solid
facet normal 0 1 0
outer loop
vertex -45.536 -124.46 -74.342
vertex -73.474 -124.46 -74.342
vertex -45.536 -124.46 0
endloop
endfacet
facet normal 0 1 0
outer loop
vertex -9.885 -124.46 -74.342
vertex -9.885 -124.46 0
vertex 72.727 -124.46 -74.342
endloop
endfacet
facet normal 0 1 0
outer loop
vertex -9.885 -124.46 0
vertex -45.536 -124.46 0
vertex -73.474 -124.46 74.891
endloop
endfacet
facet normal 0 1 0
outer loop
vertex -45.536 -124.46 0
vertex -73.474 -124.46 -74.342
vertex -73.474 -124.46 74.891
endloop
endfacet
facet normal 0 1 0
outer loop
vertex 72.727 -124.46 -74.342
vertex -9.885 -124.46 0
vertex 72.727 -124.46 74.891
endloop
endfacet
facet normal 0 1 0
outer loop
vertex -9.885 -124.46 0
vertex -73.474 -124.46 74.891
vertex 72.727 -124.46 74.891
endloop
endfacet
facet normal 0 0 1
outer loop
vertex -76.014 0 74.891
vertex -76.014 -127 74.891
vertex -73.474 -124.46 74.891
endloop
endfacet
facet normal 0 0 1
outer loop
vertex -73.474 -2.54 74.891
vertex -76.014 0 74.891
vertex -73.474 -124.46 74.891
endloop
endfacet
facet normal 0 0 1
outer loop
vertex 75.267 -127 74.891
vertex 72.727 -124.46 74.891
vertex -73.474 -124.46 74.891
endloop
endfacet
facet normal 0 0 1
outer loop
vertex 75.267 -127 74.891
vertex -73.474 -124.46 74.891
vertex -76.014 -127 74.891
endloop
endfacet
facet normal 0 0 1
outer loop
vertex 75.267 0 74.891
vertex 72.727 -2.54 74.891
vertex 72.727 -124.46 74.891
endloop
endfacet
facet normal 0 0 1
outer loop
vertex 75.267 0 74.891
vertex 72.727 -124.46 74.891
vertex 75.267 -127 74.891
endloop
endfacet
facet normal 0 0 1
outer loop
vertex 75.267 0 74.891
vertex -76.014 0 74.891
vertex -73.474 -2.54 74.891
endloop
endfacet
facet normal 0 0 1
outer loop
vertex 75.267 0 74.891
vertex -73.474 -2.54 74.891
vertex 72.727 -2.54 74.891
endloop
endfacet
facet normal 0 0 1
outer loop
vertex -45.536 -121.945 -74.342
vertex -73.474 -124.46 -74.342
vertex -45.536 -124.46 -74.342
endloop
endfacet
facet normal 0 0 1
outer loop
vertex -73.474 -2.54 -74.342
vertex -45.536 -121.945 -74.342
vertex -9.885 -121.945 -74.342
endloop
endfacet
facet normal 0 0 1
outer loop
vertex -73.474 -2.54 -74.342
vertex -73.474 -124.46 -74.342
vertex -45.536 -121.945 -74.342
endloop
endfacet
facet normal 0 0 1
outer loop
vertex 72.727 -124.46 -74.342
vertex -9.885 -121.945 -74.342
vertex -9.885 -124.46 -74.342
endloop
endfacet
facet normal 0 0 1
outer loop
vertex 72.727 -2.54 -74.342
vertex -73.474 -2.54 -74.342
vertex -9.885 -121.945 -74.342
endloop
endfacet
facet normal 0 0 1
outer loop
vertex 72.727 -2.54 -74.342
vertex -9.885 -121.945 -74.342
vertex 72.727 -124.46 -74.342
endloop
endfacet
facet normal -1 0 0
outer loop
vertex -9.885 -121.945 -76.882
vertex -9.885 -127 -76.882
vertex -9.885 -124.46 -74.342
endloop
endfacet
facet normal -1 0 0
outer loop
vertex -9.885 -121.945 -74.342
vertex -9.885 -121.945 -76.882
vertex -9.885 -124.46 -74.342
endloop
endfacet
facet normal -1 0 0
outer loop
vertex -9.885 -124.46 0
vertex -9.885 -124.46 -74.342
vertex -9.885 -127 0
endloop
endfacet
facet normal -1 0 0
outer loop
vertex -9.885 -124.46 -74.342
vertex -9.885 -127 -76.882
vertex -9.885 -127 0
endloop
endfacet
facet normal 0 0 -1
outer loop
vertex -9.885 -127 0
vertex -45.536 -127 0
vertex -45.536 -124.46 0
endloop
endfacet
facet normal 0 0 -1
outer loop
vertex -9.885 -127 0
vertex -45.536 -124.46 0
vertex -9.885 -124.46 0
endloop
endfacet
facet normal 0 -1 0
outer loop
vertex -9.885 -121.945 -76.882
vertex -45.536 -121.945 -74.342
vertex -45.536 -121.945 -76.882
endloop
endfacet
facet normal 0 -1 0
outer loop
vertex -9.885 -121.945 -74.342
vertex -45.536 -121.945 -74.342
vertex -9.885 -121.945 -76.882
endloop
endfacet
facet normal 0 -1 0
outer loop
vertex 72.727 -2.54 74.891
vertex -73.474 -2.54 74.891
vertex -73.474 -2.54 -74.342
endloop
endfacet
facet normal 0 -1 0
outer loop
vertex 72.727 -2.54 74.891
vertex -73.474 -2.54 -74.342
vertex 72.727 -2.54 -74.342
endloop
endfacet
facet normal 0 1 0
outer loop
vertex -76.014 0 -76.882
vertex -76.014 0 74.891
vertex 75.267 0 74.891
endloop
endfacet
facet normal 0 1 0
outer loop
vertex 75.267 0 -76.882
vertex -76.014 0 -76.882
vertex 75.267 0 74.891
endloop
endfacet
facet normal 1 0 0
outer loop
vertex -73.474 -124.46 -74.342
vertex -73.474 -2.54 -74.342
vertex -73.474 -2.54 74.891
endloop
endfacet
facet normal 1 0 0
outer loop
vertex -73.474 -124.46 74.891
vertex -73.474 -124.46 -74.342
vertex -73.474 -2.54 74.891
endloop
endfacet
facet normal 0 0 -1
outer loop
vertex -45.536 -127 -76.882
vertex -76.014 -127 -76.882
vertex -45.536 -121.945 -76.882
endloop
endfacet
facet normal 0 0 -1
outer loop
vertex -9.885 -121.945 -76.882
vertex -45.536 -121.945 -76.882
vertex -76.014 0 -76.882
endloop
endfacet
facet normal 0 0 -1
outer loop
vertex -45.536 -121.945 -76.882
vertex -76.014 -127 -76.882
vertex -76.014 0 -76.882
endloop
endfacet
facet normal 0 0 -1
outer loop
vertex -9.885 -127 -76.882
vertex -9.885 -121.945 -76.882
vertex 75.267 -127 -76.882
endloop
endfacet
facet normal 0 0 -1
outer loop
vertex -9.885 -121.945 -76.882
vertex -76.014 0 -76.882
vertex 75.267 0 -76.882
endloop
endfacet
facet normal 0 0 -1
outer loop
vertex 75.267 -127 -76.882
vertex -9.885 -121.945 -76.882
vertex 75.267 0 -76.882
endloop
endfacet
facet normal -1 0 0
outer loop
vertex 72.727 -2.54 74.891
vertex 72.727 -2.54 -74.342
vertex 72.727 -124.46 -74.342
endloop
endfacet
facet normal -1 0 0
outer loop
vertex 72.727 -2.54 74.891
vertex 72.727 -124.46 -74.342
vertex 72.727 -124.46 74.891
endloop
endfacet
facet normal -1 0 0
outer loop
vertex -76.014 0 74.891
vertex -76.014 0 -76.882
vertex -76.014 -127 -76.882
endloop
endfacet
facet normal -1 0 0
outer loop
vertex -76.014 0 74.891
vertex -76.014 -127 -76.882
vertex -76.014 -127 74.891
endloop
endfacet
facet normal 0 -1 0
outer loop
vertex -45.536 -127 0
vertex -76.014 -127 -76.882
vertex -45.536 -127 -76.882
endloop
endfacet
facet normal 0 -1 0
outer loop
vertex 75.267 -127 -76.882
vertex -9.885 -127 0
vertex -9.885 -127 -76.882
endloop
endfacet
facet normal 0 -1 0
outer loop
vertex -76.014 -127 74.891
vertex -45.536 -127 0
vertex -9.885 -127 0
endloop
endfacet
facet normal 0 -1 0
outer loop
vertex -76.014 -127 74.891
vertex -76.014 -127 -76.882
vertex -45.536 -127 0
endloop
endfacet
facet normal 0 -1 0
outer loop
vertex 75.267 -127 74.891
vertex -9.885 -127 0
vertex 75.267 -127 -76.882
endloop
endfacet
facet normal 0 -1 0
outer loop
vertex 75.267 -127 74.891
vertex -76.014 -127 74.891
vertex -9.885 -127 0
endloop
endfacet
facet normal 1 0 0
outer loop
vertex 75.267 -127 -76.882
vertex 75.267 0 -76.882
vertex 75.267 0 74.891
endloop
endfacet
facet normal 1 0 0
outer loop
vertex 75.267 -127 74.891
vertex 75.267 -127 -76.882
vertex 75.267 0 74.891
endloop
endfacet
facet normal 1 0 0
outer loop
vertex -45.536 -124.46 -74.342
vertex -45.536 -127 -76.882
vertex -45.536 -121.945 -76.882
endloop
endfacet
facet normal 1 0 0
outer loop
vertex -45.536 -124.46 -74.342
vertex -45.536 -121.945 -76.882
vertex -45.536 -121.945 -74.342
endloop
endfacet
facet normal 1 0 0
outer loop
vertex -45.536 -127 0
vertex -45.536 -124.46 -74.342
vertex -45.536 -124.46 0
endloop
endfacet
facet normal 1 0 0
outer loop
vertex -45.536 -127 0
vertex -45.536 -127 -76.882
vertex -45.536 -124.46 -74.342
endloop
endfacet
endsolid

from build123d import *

# Parameters (mm, degrees)
F0_W      = 152.267947793
F0_H      = 151.1743441224
F1_DEPTH  = 101.6
F2_SIZE   = 50.8
F3_SIZE   = 50.79999
F4_SIZE   = 50.8
F5_T      = -2.54
F7_W      = 151.2815654278
F7_H      = 151.7730951309
F8_DEPTH  = 127
F9_T      = -2.54
F10_W     = 35.6509871781
F10_H     = 76.8820419908
F11_DEPTH = 0.0254
F12_DEPTH = 2.54
F13_DEPTH = 2.54


# Not quite as in the source:
# - a fillet or chamfer is up to 0.001 mm smaller than in the source, because OpenCascade refuses the exact size


with BuildPart() as f1:
    # F0 (on Top) → F1 (new body)
    with BuildSketch(Plane.XY):
        with Locations((-0.6233751774, 0.4115886986)):
            Rectangle(F0_W, F0_H)
    extrude(amount=F1_DEPTH)

    # F2
    f2_edges = [f1.edges().sort_by_distance(p)[0] for p in [
        (-76.757349, 0.411589, 101.6),
        (-0.623375, -75.175583, 101.6),
        (75.510599, 0.411589, 101.6),
        (-0.623375, 75.998761, 101.6),
    ]]
    chamfer(f2_edges, length=F2_SIZE)

    # F3 (size 50.8 in the source; OpenCascade refuses exactly that, so slightly less here)
    f3_edges = [f1.edges().sort_by_distance(p)[0] for p in [
        (-0.623375, -75.175583, 0),
    ]]
    chamfer(f3_edges, length=F3_SIZE)

    # F4
    f4_edges = [f1.edges().sort_by_distance(p)[0] for p in [
        (75.510599, 75.998761, 25.4),
    ]]
    chamfer(f4_edges, length=F4_SIZE)

    # F5
    f5_openings = [f1.faces().sort_by_distance(p)[0] for p in [
        (-0.623375, 0.411589, 101.6),
    ]]
    offset(amount=F5_T, openings=f5_openings)


with BuildPart() as f8:
    # F7 (on Front) → F8 (new body)
    with BuildSketch(Plane.XZ):
        with Locations((-0.3735423088, -0.9954944253)):
            Rectangle(F7_W, F7_H)
    extrude(amount=F8_DEPTH)

    # F9
    f9_openings = [f8.faces().sort_by_distance(p)[0] for p in [
        (-0.373542, -63.5, 74.891053),
    ]]
    offset(amount=F9_T, openings=f9_openings)

    # F10 (on face) → F11 (join)
    with BuildSketch(Plane.XZ.offset(127)):
        with Locations((-27.7109388262, -38.4410209954)):
            Rectangle(F10_W, F10_H)
    extrude(amount=F11_DEPTH)

    # F12 (cut): a face of the model
    f12_faces = [f8.faces().sort_by_distance(p)[0] for p in [
        (-27.7109388262, -127.0254, -38.4410209954),
    ]]
    extrude(f12_faces, amount=-F12_DEPTH, mode=Mode.SUBTRACT)

    # F13 (cut): a face of the model
    f13_faces = [f8.faces().sort_by_distance(p)[0] for p in [
        (-27.7109388262, -124.4854, -38.4410209954),
    ]]
    extrude(f13_faces, amount=-F13_DEPTH, mode=Mode.SUBTRACT)


solid = f8.part
